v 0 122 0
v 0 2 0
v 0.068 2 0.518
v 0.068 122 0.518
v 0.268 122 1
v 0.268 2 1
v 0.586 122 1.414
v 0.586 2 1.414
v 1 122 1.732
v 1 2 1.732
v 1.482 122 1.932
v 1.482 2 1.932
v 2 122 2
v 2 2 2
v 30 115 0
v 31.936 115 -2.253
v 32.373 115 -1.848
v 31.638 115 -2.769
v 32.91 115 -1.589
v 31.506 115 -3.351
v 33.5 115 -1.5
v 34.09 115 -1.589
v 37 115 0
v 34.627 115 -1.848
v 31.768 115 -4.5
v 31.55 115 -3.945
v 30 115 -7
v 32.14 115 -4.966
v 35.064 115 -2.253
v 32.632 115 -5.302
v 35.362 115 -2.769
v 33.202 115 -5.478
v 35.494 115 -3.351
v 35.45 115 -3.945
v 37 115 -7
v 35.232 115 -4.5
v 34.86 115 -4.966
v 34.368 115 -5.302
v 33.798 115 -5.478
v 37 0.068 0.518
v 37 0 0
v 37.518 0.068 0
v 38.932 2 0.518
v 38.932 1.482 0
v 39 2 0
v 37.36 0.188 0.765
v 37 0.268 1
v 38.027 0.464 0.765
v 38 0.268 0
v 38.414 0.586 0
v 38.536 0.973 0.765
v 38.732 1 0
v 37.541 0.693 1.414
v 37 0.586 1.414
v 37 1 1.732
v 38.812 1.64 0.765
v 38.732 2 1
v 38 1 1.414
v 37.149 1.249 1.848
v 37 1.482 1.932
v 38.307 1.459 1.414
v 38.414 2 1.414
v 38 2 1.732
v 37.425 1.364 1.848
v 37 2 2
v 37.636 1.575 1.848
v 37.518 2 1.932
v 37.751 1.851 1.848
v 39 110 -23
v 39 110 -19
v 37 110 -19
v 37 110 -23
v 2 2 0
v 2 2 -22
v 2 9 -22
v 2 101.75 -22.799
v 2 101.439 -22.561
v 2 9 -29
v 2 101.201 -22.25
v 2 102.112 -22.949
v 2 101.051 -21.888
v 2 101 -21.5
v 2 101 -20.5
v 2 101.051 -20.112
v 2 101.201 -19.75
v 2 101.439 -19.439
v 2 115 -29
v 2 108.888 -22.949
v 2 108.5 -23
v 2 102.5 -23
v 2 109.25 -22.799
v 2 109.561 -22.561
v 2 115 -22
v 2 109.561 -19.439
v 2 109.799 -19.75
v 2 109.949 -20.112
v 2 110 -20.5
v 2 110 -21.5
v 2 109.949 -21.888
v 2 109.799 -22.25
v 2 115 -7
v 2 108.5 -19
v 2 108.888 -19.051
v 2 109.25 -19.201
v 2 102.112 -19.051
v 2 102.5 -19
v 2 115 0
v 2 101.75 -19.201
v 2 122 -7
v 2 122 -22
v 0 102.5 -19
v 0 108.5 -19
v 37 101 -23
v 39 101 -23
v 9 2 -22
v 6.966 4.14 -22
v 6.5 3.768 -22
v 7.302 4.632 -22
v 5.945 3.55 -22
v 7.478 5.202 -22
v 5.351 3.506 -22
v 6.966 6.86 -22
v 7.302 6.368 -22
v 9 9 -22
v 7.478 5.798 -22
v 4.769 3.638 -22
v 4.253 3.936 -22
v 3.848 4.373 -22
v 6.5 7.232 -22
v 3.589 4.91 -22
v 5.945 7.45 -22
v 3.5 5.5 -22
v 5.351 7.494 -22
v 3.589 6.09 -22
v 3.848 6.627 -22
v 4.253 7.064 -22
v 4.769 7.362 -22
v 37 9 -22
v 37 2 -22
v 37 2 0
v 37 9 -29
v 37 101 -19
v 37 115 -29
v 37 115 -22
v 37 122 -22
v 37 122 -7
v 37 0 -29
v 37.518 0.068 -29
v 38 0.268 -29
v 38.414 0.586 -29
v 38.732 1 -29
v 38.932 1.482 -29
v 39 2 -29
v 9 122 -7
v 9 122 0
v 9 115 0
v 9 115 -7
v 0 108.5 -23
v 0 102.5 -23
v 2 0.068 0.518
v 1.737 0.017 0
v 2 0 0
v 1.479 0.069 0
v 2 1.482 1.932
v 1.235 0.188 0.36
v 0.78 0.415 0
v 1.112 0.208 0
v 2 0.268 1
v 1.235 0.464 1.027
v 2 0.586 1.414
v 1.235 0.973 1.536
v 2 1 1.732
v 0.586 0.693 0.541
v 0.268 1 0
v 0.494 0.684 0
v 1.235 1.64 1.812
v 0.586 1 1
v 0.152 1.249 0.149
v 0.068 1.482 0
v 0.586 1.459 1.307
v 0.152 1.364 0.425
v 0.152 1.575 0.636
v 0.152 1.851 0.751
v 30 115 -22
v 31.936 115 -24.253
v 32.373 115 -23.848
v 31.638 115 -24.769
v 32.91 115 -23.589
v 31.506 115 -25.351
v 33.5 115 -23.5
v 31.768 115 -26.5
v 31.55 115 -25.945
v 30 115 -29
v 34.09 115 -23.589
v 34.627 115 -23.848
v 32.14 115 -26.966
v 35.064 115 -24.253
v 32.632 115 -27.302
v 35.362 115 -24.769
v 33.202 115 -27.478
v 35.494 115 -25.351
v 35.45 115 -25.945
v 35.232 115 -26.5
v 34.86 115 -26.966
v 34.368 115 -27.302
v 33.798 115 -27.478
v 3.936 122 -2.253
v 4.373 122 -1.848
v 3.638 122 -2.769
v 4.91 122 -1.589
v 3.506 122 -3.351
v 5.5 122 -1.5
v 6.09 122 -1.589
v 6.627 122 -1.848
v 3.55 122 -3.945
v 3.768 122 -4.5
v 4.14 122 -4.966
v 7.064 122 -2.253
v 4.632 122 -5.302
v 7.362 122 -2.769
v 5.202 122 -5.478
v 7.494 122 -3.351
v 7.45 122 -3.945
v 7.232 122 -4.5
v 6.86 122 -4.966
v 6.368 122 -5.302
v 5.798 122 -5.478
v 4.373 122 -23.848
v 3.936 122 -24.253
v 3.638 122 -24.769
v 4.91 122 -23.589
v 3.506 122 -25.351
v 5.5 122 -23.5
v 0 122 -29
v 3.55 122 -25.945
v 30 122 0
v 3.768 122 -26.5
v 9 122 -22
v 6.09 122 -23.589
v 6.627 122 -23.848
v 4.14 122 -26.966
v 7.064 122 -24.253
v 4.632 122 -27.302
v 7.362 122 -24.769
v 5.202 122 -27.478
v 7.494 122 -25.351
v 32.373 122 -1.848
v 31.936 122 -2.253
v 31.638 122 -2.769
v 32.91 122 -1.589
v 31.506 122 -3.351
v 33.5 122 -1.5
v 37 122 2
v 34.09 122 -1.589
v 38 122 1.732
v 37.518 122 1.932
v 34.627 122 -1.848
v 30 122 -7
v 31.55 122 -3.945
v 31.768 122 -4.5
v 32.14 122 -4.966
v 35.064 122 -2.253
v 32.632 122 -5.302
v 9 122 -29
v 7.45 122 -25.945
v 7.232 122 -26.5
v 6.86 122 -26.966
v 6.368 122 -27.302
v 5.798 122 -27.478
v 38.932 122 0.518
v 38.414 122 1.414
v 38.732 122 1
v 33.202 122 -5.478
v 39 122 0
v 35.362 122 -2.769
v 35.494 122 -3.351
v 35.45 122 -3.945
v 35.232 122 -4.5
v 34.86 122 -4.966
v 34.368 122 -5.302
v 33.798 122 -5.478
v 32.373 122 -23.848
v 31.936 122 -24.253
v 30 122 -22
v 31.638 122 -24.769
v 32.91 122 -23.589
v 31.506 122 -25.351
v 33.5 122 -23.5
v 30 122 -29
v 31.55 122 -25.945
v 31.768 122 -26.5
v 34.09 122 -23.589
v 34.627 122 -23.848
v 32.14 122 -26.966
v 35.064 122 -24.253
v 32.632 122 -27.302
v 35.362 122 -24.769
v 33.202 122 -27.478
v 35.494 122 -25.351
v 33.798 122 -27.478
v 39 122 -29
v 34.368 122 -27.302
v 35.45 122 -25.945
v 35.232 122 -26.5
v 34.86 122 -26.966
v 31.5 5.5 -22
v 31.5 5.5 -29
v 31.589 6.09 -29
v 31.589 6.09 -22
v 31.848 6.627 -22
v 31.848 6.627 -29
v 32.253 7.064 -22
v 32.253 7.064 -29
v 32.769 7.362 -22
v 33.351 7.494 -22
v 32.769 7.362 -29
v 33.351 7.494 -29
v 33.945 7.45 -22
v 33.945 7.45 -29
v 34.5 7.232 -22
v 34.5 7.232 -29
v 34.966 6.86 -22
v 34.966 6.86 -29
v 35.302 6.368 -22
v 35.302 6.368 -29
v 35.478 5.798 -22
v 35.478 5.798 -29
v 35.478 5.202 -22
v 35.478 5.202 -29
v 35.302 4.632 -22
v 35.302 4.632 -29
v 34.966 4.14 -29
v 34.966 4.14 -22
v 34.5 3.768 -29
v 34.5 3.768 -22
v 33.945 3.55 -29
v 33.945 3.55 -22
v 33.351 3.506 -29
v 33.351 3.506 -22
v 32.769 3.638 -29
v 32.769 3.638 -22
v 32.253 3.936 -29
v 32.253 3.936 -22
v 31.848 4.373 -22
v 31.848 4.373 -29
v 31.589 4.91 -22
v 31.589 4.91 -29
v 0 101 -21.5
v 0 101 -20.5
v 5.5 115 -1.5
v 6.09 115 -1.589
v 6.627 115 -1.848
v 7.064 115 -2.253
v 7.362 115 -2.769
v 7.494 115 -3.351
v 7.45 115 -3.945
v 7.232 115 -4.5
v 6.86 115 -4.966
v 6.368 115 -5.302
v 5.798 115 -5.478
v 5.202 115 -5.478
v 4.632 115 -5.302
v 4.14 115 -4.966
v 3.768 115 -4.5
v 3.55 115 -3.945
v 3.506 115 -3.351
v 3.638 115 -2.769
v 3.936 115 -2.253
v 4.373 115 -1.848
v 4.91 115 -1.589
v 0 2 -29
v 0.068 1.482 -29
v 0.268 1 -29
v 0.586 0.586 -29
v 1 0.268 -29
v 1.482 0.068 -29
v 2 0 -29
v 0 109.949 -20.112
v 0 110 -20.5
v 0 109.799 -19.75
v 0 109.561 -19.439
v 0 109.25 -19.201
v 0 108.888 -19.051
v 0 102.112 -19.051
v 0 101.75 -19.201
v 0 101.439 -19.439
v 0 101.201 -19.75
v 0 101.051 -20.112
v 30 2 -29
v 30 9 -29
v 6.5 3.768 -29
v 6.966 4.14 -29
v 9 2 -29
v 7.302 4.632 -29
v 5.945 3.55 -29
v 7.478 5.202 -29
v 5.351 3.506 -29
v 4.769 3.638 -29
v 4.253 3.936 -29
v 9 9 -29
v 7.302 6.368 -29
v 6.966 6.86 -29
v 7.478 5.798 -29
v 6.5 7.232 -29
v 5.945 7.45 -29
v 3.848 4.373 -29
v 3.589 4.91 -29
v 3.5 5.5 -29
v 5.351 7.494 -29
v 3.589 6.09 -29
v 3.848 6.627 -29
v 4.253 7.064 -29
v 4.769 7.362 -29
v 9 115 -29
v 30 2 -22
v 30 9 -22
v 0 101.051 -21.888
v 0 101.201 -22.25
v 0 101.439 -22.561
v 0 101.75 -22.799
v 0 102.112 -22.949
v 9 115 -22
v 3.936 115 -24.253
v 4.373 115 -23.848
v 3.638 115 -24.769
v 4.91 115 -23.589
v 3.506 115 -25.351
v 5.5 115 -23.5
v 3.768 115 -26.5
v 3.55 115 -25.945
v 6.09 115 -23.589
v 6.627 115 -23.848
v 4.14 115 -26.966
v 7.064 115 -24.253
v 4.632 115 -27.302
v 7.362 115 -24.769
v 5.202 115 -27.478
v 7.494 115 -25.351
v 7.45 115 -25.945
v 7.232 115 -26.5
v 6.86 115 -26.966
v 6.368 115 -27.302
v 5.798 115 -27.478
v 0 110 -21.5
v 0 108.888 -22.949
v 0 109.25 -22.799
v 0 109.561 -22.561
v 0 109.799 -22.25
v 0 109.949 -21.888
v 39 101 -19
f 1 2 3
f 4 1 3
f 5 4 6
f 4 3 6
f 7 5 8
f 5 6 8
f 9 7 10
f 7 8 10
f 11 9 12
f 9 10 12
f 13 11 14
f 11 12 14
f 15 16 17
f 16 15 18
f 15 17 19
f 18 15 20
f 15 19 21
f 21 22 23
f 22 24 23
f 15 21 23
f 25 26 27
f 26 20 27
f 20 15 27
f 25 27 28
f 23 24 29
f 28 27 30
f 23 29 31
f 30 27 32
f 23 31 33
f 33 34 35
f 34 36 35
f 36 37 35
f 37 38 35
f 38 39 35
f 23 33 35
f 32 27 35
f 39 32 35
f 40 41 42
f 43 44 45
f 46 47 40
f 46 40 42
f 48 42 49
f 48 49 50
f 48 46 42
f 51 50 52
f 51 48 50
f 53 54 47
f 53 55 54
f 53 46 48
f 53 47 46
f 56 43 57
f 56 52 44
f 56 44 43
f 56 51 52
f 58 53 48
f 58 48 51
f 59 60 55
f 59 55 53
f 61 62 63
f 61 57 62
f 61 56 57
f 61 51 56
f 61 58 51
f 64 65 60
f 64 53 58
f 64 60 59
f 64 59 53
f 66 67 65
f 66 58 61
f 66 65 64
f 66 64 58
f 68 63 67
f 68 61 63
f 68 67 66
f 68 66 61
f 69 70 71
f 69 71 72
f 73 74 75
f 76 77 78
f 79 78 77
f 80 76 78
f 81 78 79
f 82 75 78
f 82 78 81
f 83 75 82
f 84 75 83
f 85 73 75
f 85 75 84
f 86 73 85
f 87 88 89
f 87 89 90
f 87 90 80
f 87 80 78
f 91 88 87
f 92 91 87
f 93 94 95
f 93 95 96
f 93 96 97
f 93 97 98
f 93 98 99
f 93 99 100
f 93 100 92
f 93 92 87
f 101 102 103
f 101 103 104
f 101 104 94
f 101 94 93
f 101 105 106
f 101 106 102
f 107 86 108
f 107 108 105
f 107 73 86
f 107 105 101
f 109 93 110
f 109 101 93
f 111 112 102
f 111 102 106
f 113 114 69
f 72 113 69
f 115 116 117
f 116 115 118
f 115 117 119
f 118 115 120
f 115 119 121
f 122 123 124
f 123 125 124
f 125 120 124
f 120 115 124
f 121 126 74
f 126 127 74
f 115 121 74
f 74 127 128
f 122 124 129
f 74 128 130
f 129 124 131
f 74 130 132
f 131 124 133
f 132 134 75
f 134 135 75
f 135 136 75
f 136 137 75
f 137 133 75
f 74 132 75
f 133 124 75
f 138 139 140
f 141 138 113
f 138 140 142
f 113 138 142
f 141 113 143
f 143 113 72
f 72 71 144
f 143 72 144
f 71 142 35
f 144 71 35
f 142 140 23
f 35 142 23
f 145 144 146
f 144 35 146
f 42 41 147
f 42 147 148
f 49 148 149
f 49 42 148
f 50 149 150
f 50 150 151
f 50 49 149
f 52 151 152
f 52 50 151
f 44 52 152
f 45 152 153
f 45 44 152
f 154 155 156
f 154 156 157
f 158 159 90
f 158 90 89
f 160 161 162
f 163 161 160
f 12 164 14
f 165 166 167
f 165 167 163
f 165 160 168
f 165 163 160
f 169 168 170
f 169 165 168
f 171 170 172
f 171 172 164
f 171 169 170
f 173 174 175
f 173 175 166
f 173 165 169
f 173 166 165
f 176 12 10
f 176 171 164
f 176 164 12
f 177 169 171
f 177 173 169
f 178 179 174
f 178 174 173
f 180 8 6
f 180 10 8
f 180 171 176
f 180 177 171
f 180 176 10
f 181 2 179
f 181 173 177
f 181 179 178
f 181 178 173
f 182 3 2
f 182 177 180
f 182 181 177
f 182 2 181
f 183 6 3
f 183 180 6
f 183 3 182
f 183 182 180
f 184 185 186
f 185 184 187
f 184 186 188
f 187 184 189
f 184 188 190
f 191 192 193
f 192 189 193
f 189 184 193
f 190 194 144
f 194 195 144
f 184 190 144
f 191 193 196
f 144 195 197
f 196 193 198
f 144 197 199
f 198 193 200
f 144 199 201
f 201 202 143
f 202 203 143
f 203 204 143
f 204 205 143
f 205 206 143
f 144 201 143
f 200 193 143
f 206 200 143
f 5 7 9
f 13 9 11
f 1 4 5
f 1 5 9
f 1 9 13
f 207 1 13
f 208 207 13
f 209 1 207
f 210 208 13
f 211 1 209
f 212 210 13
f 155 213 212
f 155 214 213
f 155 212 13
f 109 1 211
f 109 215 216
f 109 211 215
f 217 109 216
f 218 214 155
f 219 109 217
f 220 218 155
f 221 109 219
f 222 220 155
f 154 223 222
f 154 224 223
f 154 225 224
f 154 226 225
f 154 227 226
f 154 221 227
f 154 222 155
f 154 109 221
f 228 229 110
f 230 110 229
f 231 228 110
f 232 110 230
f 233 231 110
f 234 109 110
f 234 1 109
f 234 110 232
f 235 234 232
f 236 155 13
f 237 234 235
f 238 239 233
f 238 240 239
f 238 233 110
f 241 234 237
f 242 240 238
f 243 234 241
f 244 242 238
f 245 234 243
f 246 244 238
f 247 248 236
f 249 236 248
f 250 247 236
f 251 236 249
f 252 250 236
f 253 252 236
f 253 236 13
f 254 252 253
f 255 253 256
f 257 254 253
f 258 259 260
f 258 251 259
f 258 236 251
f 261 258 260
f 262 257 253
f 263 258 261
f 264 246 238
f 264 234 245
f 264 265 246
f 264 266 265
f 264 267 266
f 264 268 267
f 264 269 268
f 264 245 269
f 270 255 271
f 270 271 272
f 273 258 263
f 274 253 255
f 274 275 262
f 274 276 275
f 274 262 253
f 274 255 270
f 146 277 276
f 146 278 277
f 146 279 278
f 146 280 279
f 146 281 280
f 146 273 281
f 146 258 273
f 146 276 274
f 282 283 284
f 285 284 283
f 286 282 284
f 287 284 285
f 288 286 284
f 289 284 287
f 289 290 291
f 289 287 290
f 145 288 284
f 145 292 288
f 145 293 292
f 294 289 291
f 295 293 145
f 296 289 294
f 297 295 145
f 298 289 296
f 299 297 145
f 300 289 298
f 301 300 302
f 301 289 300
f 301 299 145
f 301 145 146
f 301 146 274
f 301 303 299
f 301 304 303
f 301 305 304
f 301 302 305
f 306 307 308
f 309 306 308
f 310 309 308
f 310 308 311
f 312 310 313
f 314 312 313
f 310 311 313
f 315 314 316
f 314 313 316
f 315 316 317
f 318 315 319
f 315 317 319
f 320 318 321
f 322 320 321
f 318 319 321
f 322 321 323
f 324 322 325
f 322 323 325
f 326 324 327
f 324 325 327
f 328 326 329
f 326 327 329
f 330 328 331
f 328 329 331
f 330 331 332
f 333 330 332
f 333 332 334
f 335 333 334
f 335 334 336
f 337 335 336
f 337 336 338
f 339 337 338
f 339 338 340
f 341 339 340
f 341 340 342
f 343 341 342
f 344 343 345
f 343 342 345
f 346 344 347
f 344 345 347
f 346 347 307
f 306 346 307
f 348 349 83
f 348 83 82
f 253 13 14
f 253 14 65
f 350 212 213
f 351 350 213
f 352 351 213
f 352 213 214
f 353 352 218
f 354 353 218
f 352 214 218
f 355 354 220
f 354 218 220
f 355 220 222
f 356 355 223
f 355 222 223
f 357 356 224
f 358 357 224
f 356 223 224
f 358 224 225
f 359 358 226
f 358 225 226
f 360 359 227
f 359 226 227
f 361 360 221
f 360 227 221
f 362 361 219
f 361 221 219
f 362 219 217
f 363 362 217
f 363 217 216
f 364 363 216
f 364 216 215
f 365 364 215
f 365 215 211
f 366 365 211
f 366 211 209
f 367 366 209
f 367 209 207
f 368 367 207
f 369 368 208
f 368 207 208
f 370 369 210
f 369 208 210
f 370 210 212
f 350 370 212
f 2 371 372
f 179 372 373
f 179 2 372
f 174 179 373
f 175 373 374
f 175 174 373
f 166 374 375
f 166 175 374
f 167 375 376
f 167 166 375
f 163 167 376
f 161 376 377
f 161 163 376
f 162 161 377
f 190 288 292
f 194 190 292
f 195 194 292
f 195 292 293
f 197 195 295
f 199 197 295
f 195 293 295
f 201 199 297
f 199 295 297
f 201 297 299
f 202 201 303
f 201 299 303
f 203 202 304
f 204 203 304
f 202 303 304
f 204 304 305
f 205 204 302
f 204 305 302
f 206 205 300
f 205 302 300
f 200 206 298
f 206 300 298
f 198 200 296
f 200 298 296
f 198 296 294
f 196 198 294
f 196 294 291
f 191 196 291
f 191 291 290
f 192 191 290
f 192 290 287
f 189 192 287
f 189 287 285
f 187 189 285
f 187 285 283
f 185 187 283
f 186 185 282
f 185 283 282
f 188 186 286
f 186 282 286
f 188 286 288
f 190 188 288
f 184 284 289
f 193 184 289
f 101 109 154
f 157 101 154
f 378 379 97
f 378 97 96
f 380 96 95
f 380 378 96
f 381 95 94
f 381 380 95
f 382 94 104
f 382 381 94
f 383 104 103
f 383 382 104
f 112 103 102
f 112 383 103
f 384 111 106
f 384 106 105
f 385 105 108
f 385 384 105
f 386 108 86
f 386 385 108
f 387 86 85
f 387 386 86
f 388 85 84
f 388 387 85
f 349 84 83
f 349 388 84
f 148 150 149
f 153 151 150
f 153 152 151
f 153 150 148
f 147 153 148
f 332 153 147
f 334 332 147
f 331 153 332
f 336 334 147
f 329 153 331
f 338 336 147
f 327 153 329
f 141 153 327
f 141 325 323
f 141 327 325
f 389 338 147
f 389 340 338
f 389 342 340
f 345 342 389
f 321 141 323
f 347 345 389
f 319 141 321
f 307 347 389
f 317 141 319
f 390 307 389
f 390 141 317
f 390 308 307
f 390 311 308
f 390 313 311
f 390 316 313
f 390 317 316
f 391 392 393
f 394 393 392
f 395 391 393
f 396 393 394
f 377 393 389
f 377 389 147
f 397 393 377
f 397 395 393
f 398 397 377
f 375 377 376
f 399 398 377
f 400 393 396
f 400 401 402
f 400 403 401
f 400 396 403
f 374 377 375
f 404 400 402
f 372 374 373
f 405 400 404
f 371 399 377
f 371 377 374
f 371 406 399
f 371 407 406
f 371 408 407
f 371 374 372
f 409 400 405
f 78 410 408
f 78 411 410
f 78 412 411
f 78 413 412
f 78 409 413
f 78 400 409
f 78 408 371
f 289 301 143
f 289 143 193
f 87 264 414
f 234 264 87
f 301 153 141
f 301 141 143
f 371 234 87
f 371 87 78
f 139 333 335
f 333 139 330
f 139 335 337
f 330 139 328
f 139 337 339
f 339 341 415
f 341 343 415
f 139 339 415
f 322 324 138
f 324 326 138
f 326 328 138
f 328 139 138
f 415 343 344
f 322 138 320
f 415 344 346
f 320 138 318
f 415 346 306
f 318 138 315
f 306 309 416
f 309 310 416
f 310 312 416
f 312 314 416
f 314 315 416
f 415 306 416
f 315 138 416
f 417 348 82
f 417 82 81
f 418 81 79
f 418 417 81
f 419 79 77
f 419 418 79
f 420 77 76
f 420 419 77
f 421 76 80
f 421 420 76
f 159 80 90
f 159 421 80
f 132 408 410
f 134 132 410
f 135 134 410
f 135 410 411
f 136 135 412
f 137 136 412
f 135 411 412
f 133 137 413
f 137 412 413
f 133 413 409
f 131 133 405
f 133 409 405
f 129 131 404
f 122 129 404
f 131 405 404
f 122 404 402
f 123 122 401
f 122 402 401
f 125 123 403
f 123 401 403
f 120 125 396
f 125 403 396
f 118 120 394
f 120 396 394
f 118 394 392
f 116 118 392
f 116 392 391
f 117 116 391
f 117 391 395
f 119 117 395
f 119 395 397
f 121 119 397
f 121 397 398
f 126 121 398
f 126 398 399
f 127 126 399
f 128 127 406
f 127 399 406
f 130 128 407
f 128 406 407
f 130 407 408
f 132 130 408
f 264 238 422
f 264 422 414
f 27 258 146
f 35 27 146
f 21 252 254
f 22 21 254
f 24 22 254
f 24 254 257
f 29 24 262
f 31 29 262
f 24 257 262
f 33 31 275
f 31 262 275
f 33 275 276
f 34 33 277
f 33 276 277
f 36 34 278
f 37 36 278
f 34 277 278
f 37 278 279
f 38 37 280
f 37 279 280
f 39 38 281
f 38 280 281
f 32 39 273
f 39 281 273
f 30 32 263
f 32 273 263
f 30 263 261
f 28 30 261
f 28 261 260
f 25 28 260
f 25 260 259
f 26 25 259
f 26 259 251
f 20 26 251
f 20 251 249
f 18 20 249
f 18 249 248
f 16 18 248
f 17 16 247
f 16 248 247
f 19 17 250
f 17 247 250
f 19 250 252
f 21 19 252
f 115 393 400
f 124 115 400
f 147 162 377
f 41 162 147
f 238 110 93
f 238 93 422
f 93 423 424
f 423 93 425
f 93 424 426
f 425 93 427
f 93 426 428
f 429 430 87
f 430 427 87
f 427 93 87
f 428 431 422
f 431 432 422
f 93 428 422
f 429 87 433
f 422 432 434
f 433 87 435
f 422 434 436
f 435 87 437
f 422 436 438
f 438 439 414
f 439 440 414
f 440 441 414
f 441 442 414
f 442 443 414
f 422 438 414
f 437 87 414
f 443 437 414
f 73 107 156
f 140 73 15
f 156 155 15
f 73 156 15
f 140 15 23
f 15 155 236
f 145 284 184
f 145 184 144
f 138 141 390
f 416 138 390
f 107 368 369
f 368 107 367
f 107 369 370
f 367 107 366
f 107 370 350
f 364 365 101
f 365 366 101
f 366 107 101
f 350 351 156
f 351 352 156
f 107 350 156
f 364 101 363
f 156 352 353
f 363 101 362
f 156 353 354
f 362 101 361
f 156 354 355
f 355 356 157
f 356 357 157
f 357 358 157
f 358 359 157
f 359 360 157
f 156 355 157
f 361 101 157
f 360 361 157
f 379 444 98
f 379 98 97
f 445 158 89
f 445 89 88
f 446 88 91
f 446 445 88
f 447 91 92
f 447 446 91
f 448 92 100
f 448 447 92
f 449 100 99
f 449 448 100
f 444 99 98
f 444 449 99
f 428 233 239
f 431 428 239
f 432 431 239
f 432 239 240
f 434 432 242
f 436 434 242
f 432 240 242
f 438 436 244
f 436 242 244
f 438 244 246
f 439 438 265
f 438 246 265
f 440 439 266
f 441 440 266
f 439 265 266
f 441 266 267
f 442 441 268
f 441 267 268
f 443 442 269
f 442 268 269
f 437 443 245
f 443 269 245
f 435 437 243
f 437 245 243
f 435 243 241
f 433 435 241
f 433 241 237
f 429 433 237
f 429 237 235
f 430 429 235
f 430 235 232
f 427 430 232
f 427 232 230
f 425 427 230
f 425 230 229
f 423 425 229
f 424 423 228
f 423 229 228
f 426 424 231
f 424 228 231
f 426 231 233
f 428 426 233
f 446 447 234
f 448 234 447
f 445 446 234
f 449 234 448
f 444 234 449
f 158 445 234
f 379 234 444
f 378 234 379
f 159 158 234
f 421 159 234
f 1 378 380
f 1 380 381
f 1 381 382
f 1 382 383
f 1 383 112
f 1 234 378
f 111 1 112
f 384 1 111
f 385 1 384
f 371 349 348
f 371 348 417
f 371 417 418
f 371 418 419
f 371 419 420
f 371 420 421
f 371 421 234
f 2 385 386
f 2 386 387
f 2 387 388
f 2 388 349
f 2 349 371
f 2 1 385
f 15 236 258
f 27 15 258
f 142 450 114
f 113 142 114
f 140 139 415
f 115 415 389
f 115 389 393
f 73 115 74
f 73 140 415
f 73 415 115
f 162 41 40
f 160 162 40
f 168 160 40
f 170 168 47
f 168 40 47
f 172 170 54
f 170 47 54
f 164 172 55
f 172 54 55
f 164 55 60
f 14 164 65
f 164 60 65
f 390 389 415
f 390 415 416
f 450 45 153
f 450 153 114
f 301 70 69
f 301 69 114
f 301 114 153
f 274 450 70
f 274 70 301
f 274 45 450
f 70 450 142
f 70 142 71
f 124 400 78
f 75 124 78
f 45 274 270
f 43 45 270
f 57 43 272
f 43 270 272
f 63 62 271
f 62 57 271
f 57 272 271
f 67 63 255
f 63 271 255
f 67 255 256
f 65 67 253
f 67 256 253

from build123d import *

# Parameters (mm, degrees)
SKETCH1_W            = 39
SKETCH1_H            = 122
BOSS_EXTRUDE2_DEPTH  = 2
SKETCH2_W            = 2
SKETCH2_H            = 122
BOSS_EXTRUDE3_DEPTH  = 25
SKETCH3_W            = 2
SKETCH3_H            = 122
BOSS_EXTRUDE4_DEPTH  = 25
SKETCH4_W            = 35
SKETCH4_H            = 2
BOSS_EXTRUDE5_DEPTH  = 25
FILLET2_R            = 2
BOSS_EXTRUDE7_DEPTH  = 4
CUT_EXTRUDE2_DEPTH   = 4
SKETCH5_W            = 4
SKETCH5_H            = 9
CUT_EXTRUDE3_DEPTH   = 4
FILLET4_R            = 2
SKETCH8_W            = 7
SKETCH8_H            = 7
BOSS_EXTRUDE8_DEPTH  = 7
SKETCH9_W            = 7
SKETCH9_H            = 7
BOSS_EXTRUDE10_DEPTH = 7
SKETCH10_R           = 2
CUT_EXTRUDE6_DEPTH   = 7
SKETCH11_W           = 7
SKETCH11_H           = 7
BOSS_EXTRUDE11_DEPTH = 7
SKETCH12_R           = 2
CUT_EXTRUDE7_DEPTH   = 7


with BuildPart() as part:
    # Sketch1 → Boss-Extrude2 (new body)
    with BuildSketch(Plane.XY):
        with Locations((19.5, 61)):
            Rectangle(SKETCH1_W, SKETCH1_H)
    extrude(amount=BOSS_EXTRUDE2_DEPTH)

    # Sketch2 → Boss-Extrude3 (add)
    with BuildSketch(Plane(origin=(0, 0, 0), x_dir=(-1, 0, 0), z_dir=(0, 0, -1))):
        with Locations((-38, 61)):
            Rectangle(SKETCH2_W, SKETCH2_H)
    extrude(amount=BOSS_EXTRUDE3_DEPTH)

    # Sketch3 → Boss-Extrude4 (add)
    with BuildSketch(Plane(origin=(0, 0, 0), x_dir=(-1, 0, 0), z_dir=(0, 0, -1))):
        with Locations((-1, 61)):
            Rectangle(SKETCH3_W, SKETCH3_H)
    extrude(amount=BOSS_EXTRUDE4_DEPTH)

    # Sketch4 → Boss-Extrude5 (add)
    with BuildSketch(Plane(origin=(0, 0, 0), x_dir=(-1, 0, 0), z_dir=(0, 0, -1))):
        with Locations((-19.5, 1)):
            Rectangle(SKETCH4_W, SKETCH4_H)
    extrude(amount=BOSS_EXTRUDE5_DEPTH)

    # Fillet2
    fillet2_edges = [part.edges().sort_by_distance(p)[0] for p in [
        (19.5, 0, 2),
        (0, 0, -11.5),
        (39, 0, -11.5),
    ]]
    fillet(fillet2_edges, radius=FILLET2_R)

    # Sketch6 → Boss-Extrude7 (add)
    with BuildSketch(Plane(origin=(0, 0, -25), x_dir=(-1, 0, 0), z_dir=(0, 0, -1))):
        with BuildLine():
            Line((-2, 122), (0, 122))
            Line((0, 122), (0, 2))
            ThreePointArc((0, 2), (-0.585786438, 0.585786438), (-2, 0))
            Line((-2, 0), (-37, 0))
            ThreePointArc((-37, 0), (-38.414213562, 0.585786438), (-39, 2))
            Line((-39, 2), (-39, 122))
            Line((-39, 122), (-37, 122))
            Line((-37, 122), (-37, 2))
            Line((-37, 2), (-2, 2))
            Line((-2, 2), (-2, 122))
        make_face()
    extrude(amount=BOSS_EXTRUDE7_DEPTH)

    # Sketch7 → Cut-Extrude2 (cut)
    with BuildSketch(Plane.ZY):
        with BuildLine():
            Line((-21.5, 110), (-20.5, 110))
            ThreePointArc((-20.5, 110), (-19.439339828, 109.560660172), (-19, 108.5))
            Line((-19, 108.5), (-19, 102.5))
            ThreePointArc((-19, 102.5), (-19.439339828, 101.439339828), (-20.5, 101))
            Line((-20.5, 101), (-21.5, 101))
            ThreePointArc((-21.5, 101), (-22.560660172, 101.439339828), (-23, 102.5))
            Line((-23, 102.5), (-23, 108.5))
            ThreePointArc((-23, 108.5), (-22.560660172, 109.560660172), (-21.5, 110))
        make_face()
    extrude(amount=-CUT_EXTRUDE2_DEPTH, mode=Mode.SUBTRACT)

    # Sketch5 → Cut-Extrude3 (cut)
    with BuildSketch(Plane(origin=(39, 0, 0), x_dir=(0, 0, -1), z_dir=(1, 0, 0))):
        with Locations((21, 105.5)):
            Rectangle(SKETCH5_W, SKETCH5_H)
    extrude(amount=-CUT_EXTRUDE3_DEPTH, mode=Mode.SUBTRACT)

    # Fillet4
    # the kernel refuses this fillet: 2 mm, written as the material it takes off along each edge
    with BuildSketch(Plane(origin=(37, 2, 0), x_dir=(1, 0, 0), z_dir=(0, 0, 1))) as fillet4_piece_1_section:
        Polygon((0, 0), (FILLET4_R, 0), (FILLET4_R, -FILLET4_R), (0, -FILLET4_R), align=None)
    fillet4_piece_1 = extrude(amount=FILLET4_R, mode=Mode.PRIVATE)
    fillet4_piece_1 = fillet4_piece_1 - Plane(origin=(37, 2, 0), x_dir=(-0.7071067811865476, 0.7071067811865475, 0), z_dir=(0, 0, 1)) * Sphere(FILLET4_R, mode=Mode.PRIVATE)
    add(fillet4_piece_1, mode=Mode.SUBTRACT)
    with BuildSketch(Plane(origin=(2, 2, 0), x_dir=(0, 0, 1), z_dir=(-1, 0, 0))) as fillet4_piece_2_section:
        Polygon((0, 0), (FILLET4_R, 0), (FILLET4_R, -FILLET4_R), (0, -FILLET4_R), align=None)
    fillet4_piece_2 = extrude(amount=FILLET4_R, mode=Mode.PRIVATE)
    fillet4_piece_2 = fillet4_piece_2 - Plane(origin=(2, 2, 0), x_dir=(0, 0.7071067811865475, -0.7071067811865475), z_dir=(-1, 0, 0)) * Sphere(FILLET4_R, mode=Mode.PRIVATE)
    add(fillet4_piece_2, mode=Mode.SUBTRACT)
    with BuildSketch(Plane(origin=(0, 2, 2), x_dir=(0, 0, -1), z_dir=(0, 1, 0))) as fillet4_piece_3:
        with BuildLine():
            CenterArc((FILLET4_R, -FILLET4_R), FILLET4_R, 90, 90)
            Line((0, -FILLET4_R), (0, 0))
            Line((0, 0), (FILLET4_R, 0))
        make_face()
    extrude(amount=125, mode=Mode.SUBTRACT)
    with BuildSketch(Plane(origin=(39, 127, 2), x_dir=(-1, 0, 0), z_dir=(0, -1, 0))) as fillet4_piece_4:
        with BuildLine():
            CenterArc((FILLET4_R, FILLET4_R), FILLET4_R, 180, 90)
            Line((0, FILLET4_R), (0, 0))
            Line((0, 0), (FILLET4_R, 0))
        make_face()
    extrude(amount=125, mode=Mode.SUBTRACT)

    # Sketch8 → Boss-Extrude8 (add)
    with BuildSketch(Plane(origin=(0, 0, -29), x_dir=(-1, 0, 0), z_dir=(0, 0, -1))):
        with Locations((-33.5, 5.5)):
            Rectangle(SKETCH8_W, SKETCH8_H)
    extrude(amount=-BOSS_EXTRUDE8_DEPTH)

    # Sketch9 → Boss-Extrude10 (add)
    with BuildSketch(Plane(origin=(0, 0, -29), x_dir=(-1, 0, 0), z_dir=(0, 0, -1))):
        with Locations((-5.5, 5.5)):
            Rectangle(SKETCH9_W, SKETCH9_H)
    extrude(amount=-BOSS_EXTRUDE10_DEPTH)

    # Sketch10 → Cut-Extrude6 (cut)
    with BuildSketch(Plane(origin=(0, 0, -29), x_dir=(-1, 0, 0), z_dir=(0, 0, -1))):
        with Locations((-33.5, 5.5)):
            Circle(SKETCH10_R)
        with Locations((-5.5, 5.5)):
            Circle(SKETCH10_R)
    extrude(amount=-CUT_EXTRUDE6_DEPTH, mode=Mode.SUBTRACT)

    # Sketch11 → Boss-Extrude11 (add)
    with BuildSketch(Plane(origin=(0, 122, 0), x_dir=(1, 0, 0), z_dir=(0, 1, 0))):
        with Locations((5.5, 3.5)):
            Rectangle(SKETCH11_W, SKETCH11_H)
        with Locations((33.5, 3.5)):
            Rectangle(SKETCH11_W, SKETCH11_H)
        with Locations((5.5, 25.5)):
            Rectangle(SKETCH11_W, SKETCH11_H)
        with Locations((33.5, 25.5)):
            Rectangle(SKETCH11_W, SKETCH11_H)
    extrude(amount=-BOSS_EXTRUDE11_DEPTH)

    # Sketch12 → Cut-Extrude7 (cut)
    with BuildSketch(Plane(origin=(0, 122, 0), x_dir=(1, 0, 0), z_dir=(0, 1, 0))):
        with Locations(Location((5.5, 25.5, 0), (0, 0, 270))):
            Circle(SKETCH12_R)
        with Locations(Location((33.5, 25.5, 0), (0, 0, 270))):
            Circle(SKETCH12_R)
        with Locations(Location((5.5, 3.5, 0), (0, 0, 270))):
            Circle(SKETCH12_R)
        with Locations(Location((33.5, 3.5, 0), (0, 0, 270))):
            Circle(SKETCH12_R)
    extrude(amount=-CUT_EXTRUDE7_DEPTH, mode=Mode.SUBTRACT)


solid = part.part
